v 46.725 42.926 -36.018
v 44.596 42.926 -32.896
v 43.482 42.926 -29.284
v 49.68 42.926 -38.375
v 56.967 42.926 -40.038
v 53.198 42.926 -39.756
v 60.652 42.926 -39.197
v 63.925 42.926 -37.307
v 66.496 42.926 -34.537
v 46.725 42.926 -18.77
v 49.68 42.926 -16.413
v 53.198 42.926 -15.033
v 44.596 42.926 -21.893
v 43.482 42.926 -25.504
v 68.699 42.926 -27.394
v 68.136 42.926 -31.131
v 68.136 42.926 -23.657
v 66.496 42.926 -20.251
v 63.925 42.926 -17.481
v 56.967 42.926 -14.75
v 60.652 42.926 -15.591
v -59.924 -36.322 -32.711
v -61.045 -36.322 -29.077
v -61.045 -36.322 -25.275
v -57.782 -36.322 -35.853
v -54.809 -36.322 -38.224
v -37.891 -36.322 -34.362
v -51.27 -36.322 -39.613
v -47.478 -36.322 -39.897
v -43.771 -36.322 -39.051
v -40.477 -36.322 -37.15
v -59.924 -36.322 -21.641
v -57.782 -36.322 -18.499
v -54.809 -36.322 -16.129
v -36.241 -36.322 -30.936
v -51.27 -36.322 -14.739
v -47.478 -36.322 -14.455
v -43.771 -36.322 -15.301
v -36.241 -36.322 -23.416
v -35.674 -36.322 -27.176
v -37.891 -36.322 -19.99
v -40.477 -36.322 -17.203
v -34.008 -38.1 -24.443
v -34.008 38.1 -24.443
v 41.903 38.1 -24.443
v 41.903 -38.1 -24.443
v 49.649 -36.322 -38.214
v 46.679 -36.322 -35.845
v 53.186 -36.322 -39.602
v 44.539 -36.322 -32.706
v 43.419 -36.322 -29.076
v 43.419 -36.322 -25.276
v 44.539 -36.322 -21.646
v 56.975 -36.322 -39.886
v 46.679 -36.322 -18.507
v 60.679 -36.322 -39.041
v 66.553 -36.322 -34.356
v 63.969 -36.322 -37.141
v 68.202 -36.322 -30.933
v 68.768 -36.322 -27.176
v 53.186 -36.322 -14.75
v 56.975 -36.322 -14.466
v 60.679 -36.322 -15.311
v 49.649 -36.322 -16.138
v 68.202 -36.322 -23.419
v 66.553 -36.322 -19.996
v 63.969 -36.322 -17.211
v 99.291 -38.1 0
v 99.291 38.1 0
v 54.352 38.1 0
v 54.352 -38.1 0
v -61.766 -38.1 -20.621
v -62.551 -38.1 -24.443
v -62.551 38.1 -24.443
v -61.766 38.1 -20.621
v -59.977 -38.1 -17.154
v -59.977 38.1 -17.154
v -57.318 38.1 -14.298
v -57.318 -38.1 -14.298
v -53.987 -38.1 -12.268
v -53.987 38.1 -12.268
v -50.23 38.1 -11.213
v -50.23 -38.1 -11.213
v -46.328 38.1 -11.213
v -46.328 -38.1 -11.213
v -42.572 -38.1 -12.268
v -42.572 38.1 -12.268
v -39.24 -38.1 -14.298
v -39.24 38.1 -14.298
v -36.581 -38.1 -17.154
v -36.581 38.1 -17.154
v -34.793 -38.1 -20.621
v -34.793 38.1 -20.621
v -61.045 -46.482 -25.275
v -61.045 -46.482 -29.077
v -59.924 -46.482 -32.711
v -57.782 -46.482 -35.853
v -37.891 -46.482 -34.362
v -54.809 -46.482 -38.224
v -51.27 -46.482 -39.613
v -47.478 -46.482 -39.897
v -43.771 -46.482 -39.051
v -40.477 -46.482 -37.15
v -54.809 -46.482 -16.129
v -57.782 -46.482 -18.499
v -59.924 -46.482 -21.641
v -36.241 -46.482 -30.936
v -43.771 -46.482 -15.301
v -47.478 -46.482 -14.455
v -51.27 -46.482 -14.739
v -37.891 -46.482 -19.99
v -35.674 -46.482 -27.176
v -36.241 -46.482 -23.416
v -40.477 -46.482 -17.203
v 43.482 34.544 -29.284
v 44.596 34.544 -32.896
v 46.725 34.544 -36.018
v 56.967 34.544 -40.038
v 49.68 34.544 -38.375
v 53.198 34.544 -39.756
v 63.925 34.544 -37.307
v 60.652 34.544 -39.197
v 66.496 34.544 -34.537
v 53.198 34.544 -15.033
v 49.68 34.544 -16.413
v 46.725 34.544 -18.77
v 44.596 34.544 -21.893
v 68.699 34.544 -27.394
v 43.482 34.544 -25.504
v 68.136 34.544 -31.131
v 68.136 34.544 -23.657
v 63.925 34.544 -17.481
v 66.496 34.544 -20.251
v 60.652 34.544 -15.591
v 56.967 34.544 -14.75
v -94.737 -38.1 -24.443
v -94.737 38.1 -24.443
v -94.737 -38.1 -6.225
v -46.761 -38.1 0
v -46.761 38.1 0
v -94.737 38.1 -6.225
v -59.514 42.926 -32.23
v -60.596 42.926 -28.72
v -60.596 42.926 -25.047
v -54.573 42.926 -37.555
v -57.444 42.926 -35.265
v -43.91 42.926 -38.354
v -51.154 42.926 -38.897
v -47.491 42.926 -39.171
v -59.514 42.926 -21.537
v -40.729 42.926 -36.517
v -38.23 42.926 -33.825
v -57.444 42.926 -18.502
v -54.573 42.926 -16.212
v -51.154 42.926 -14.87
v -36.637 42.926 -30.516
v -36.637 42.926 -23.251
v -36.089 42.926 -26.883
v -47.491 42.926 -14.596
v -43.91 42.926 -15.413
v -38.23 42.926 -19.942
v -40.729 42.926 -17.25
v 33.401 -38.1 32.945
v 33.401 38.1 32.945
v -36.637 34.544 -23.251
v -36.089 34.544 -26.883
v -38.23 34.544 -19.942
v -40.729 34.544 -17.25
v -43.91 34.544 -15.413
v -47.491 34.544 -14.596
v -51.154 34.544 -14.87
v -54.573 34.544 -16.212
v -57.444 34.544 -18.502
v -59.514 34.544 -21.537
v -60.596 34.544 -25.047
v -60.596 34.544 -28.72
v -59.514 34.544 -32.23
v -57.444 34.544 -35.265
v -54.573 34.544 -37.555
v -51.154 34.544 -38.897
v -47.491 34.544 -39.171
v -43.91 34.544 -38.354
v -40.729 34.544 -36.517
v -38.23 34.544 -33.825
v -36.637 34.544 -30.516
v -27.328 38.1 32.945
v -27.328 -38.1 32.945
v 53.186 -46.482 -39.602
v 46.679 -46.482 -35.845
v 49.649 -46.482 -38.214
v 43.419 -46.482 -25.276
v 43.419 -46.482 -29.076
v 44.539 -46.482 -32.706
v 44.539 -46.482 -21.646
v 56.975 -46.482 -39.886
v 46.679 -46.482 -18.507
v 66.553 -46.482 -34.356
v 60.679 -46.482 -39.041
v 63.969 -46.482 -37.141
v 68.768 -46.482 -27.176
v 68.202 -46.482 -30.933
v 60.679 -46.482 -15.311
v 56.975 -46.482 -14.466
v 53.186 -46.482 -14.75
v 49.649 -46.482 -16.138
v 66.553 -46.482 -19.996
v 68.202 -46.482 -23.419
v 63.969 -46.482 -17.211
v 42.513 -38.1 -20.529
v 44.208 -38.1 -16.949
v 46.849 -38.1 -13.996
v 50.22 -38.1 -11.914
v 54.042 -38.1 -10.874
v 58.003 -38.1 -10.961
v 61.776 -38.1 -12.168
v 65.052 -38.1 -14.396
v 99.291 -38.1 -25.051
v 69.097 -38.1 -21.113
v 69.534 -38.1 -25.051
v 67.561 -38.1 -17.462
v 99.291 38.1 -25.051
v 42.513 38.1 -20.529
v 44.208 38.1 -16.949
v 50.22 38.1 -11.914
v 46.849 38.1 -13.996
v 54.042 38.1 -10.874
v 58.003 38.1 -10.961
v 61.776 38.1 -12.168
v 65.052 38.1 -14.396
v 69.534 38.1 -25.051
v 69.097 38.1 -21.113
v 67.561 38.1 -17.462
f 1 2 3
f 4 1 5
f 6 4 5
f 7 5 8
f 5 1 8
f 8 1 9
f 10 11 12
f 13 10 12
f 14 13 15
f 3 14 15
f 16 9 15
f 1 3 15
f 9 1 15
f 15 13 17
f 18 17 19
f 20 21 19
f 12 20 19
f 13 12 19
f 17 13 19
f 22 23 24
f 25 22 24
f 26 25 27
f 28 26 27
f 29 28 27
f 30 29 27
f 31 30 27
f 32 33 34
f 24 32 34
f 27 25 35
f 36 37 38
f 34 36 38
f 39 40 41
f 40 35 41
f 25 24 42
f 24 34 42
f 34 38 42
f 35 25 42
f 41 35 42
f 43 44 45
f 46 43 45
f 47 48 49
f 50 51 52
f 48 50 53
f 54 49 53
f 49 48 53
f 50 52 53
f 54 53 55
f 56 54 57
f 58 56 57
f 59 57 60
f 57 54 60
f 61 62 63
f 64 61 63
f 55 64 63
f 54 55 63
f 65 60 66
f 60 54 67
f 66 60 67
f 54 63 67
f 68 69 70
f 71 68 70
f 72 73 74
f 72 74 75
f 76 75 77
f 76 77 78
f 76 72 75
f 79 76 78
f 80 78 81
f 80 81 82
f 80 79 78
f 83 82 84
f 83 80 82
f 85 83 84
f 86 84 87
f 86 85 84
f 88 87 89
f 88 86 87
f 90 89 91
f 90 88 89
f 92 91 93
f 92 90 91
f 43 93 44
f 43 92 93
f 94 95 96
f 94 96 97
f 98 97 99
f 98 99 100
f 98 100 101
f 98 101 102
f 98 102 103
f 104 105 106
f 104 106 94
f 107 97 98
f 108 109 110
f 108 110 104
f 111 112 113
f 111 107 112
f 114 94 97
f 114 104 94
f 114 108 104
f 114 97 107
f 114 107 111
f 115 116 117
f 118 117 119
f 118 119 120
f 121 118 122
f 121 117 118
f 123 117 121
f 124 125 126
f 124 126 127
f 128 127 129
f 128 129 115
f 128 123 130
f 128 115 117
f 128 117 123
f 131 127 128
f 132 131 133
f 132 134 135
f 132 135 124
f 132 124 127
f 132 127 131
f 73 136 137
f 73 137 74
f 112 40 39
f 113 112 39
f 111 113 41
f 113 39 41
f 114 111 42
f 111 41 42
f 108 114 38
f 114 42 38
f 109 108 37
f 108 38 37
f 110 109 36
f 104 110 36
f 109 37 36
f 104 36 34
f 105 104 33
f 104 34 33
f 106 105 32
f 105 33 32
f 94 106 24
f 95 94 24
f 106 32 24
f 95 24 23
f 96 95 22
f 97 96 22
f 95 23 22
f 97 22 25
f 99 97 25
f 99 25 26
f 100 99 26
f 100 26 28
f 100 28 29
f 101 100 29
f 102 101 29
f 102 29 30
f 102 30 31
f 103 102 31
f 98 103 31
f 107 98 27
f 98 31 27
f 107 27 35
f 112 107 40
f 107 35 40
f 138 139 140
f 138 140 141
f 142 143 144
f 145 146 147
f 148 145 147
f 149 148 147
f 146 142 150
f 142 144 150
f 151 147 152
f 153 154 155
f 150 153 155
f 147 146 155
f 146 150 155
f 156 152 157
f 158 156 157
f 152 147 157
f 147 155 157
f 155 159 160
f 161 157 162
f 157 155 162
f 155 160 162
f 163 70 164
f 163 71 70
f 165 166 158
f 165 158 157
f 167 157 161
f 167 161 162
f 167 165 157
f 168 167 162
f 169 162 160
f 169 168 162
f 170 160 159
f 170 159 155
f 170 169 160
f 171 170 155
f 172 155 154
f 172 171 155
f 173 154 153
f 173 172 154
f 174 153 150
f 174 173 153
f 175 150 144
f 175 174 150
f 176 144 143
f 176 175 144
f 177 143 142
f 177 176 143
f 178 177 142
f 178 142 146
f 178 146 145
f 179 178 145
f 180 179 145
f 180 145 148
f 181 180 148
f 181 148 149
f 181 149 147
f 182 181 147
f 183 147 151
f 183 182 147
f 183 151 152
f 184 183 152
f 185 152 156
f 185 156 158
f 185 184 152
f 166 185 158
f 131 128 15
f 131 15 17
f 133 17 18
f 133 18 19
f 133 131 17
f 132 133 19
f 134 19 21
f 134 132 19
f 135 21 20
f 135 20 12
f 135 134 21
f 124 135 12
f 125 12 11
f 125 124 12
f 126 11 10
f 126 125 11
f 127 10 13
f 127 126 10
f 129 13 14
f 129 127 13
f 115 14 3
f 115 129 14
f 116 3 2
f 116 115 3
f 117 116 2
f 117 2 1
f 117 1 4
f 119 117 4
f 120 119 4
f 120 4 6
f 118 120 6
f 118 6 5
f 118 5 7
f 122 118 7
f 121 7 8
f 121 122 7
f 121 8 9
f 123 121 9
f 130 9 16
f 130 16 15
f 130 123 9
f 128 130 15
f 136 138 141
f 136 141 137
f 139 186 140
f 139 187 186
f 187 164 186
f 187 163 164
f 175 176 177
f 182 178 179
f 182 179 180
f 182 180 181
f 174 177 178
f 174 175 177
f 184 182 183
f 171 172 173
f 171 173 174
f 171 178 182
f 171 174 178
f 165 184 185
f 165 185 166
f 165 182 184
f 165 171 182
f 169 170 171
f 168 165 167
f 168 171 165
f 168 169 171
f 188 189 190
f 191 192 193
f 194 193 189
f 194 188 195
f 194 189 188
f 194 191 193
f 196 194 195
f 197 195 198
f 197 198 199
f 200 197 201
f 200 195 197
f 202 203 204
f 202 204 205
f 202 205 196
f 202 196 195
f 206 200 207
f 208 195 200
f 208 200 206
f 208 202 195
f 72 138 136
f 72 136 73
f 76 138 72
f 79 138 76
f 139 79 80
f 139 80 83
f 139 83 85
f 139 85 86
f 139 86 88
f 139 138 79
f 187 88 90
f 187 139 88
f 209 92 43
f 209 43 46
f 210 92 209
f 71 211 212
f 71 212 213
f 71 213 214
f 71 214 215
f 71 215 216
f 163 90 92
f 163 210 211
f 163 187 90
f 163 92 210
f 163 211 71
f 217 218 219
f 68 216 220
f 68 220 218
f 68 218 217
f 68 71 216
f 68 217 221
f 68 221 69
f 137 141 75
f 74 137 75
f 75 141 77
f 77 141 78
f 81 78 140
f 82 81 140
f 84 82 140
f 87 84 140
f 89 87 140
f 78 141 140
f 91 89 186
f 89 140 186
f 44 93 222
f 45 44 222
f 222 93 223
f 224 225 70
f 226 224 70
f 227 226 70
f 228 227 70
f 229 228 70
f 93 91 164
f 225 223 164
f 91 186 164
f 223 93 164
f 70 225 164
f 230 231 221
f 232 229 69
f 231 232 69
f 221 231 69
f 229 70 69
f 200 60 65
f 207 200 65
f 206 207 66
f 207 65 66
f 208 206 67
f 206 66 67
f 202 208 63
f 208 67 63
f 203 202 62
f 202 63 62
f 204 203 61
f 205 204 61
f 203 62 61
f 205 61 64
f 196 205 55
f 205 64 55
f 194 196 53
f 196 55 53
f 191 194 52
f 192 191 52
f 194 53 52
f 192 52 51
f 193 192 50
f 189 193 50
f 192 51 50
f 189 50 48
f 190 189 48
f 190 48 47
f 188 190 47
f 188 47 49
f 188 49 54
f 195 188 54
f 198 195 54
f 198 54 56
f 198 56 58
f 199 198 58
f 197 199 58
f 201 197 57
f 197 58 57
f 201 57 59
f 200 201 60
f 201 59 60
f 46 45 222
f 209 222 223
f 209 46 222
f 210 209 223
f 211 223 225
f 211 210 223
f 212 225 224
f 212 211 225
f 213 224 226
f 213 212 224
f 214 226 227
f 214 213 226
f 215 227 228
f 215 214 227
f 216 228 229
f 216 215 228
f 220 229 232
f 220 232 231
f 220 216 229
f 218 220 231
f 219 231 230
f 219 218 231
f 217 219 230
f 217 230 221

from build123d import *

# Parameters (mm, degrees)
F1_DEPTH      = 38.1
F1_DEPTH_BACK = 38.1
F3_START      = 36.322
F2_R          = 12.7566324115
F3_DEPTH      = 10.16
F2_R_2        = 12.7457855715
F5_START      = -34.544
F4_R          = 12.6795167038
F5_DEPTH      = 8.382
F4_R_2        = 12.3222708478


with BuildPart() as f1:
    # F0 (on Front) → F1 (new body, two sides)
    with BuildSketch(Plane.XZ) as f1_sk:
        with BuildLine():
            Line((-27.3278951645, 32.9452939332), (-46.7610619962, 0))
            Line((-46.7610619962, 0), (-94.7366952896, -6.2246867456))
            Line((-94.7366952896, -6.2246867456), (-94.7366952896, -24.4432818145))
            Line((-94.7366952896, -24.4432818145), (-62.5505149364, -24.4432818145))
            ThreePointArc((-62.5505149364, -24.4432818145), (-48.279279843, -11.0797562121), (-34.0080447495, -24.4432818145))
            Line((-34.0080447495, -24.4432818145), (41.9027730823, -24.4432818145))
            ThreePointArc((41.9027730823, -24.4432818145), (56.0256108459, -10.775277267), (69.5343092084, -25.0505693257))
            Line((69.5343092084, -25.0505693257), (99.2913544178, -25.0505693257))
            Line((99.2913544178, -25.0505693257), (99.2913544178, 0))
            Line((99.2913544178, 0), (54.3521419168, 0))
            Line((54.3521419168, 0), (33.4007553756, 32.9452939332))
            Line((33.4007553756, 32.9452939332), (-27.3278951645, 32.9452939332))
        make_face()
    extrude(amount=F1_DEPTH)
    extrude(f1_sk.sketch, amount=-F1_DEPTH_BACK)


with BuildPart() as f3:
    # F2 (on Front) → F3 (new body)
    with BuildSketch(Plane.XZ.offset(F3_START)):
        with Locations((-48.4310947359, -27.176072821)):
            Circle(F2_R)
    extrude(amount=F3_DEPTH)


with BuildPart() as f3b:
    # F2 (on Front) → F3, piece 2 (new body)
    with BuildSketch(Plane.XZ.offset(F3_START)):
        with Locations((56.0221858323, -27.176072821)):
            Circle(F2_R_2)
    extrude(amount=F3_DEPTH)


with BuildPart() as f5:
    # F4 (on Front) → F5 (new body)
    with BuildSketch(Plane.XZ.offset(F5_START)):
        with Locations((56.0194589198, -27.3941215128)):
            Circle(F4_R)
    extrude(amount=-F5_DEPTH)


with BuildPart() as f5b:
    # F4 (on Front) → F5, piece 2 (new body)
    with BuildSketch(Plane.XZ.offset(F5_START)):
        with Locations((-48.411551863, -26.883456856)):
            Circle(F4_R_2)
    extrude(amount=-F5_DEPTH)


solid = Compound([f1.part, f3.part, f3b.part, f5.part, f5b.part])
